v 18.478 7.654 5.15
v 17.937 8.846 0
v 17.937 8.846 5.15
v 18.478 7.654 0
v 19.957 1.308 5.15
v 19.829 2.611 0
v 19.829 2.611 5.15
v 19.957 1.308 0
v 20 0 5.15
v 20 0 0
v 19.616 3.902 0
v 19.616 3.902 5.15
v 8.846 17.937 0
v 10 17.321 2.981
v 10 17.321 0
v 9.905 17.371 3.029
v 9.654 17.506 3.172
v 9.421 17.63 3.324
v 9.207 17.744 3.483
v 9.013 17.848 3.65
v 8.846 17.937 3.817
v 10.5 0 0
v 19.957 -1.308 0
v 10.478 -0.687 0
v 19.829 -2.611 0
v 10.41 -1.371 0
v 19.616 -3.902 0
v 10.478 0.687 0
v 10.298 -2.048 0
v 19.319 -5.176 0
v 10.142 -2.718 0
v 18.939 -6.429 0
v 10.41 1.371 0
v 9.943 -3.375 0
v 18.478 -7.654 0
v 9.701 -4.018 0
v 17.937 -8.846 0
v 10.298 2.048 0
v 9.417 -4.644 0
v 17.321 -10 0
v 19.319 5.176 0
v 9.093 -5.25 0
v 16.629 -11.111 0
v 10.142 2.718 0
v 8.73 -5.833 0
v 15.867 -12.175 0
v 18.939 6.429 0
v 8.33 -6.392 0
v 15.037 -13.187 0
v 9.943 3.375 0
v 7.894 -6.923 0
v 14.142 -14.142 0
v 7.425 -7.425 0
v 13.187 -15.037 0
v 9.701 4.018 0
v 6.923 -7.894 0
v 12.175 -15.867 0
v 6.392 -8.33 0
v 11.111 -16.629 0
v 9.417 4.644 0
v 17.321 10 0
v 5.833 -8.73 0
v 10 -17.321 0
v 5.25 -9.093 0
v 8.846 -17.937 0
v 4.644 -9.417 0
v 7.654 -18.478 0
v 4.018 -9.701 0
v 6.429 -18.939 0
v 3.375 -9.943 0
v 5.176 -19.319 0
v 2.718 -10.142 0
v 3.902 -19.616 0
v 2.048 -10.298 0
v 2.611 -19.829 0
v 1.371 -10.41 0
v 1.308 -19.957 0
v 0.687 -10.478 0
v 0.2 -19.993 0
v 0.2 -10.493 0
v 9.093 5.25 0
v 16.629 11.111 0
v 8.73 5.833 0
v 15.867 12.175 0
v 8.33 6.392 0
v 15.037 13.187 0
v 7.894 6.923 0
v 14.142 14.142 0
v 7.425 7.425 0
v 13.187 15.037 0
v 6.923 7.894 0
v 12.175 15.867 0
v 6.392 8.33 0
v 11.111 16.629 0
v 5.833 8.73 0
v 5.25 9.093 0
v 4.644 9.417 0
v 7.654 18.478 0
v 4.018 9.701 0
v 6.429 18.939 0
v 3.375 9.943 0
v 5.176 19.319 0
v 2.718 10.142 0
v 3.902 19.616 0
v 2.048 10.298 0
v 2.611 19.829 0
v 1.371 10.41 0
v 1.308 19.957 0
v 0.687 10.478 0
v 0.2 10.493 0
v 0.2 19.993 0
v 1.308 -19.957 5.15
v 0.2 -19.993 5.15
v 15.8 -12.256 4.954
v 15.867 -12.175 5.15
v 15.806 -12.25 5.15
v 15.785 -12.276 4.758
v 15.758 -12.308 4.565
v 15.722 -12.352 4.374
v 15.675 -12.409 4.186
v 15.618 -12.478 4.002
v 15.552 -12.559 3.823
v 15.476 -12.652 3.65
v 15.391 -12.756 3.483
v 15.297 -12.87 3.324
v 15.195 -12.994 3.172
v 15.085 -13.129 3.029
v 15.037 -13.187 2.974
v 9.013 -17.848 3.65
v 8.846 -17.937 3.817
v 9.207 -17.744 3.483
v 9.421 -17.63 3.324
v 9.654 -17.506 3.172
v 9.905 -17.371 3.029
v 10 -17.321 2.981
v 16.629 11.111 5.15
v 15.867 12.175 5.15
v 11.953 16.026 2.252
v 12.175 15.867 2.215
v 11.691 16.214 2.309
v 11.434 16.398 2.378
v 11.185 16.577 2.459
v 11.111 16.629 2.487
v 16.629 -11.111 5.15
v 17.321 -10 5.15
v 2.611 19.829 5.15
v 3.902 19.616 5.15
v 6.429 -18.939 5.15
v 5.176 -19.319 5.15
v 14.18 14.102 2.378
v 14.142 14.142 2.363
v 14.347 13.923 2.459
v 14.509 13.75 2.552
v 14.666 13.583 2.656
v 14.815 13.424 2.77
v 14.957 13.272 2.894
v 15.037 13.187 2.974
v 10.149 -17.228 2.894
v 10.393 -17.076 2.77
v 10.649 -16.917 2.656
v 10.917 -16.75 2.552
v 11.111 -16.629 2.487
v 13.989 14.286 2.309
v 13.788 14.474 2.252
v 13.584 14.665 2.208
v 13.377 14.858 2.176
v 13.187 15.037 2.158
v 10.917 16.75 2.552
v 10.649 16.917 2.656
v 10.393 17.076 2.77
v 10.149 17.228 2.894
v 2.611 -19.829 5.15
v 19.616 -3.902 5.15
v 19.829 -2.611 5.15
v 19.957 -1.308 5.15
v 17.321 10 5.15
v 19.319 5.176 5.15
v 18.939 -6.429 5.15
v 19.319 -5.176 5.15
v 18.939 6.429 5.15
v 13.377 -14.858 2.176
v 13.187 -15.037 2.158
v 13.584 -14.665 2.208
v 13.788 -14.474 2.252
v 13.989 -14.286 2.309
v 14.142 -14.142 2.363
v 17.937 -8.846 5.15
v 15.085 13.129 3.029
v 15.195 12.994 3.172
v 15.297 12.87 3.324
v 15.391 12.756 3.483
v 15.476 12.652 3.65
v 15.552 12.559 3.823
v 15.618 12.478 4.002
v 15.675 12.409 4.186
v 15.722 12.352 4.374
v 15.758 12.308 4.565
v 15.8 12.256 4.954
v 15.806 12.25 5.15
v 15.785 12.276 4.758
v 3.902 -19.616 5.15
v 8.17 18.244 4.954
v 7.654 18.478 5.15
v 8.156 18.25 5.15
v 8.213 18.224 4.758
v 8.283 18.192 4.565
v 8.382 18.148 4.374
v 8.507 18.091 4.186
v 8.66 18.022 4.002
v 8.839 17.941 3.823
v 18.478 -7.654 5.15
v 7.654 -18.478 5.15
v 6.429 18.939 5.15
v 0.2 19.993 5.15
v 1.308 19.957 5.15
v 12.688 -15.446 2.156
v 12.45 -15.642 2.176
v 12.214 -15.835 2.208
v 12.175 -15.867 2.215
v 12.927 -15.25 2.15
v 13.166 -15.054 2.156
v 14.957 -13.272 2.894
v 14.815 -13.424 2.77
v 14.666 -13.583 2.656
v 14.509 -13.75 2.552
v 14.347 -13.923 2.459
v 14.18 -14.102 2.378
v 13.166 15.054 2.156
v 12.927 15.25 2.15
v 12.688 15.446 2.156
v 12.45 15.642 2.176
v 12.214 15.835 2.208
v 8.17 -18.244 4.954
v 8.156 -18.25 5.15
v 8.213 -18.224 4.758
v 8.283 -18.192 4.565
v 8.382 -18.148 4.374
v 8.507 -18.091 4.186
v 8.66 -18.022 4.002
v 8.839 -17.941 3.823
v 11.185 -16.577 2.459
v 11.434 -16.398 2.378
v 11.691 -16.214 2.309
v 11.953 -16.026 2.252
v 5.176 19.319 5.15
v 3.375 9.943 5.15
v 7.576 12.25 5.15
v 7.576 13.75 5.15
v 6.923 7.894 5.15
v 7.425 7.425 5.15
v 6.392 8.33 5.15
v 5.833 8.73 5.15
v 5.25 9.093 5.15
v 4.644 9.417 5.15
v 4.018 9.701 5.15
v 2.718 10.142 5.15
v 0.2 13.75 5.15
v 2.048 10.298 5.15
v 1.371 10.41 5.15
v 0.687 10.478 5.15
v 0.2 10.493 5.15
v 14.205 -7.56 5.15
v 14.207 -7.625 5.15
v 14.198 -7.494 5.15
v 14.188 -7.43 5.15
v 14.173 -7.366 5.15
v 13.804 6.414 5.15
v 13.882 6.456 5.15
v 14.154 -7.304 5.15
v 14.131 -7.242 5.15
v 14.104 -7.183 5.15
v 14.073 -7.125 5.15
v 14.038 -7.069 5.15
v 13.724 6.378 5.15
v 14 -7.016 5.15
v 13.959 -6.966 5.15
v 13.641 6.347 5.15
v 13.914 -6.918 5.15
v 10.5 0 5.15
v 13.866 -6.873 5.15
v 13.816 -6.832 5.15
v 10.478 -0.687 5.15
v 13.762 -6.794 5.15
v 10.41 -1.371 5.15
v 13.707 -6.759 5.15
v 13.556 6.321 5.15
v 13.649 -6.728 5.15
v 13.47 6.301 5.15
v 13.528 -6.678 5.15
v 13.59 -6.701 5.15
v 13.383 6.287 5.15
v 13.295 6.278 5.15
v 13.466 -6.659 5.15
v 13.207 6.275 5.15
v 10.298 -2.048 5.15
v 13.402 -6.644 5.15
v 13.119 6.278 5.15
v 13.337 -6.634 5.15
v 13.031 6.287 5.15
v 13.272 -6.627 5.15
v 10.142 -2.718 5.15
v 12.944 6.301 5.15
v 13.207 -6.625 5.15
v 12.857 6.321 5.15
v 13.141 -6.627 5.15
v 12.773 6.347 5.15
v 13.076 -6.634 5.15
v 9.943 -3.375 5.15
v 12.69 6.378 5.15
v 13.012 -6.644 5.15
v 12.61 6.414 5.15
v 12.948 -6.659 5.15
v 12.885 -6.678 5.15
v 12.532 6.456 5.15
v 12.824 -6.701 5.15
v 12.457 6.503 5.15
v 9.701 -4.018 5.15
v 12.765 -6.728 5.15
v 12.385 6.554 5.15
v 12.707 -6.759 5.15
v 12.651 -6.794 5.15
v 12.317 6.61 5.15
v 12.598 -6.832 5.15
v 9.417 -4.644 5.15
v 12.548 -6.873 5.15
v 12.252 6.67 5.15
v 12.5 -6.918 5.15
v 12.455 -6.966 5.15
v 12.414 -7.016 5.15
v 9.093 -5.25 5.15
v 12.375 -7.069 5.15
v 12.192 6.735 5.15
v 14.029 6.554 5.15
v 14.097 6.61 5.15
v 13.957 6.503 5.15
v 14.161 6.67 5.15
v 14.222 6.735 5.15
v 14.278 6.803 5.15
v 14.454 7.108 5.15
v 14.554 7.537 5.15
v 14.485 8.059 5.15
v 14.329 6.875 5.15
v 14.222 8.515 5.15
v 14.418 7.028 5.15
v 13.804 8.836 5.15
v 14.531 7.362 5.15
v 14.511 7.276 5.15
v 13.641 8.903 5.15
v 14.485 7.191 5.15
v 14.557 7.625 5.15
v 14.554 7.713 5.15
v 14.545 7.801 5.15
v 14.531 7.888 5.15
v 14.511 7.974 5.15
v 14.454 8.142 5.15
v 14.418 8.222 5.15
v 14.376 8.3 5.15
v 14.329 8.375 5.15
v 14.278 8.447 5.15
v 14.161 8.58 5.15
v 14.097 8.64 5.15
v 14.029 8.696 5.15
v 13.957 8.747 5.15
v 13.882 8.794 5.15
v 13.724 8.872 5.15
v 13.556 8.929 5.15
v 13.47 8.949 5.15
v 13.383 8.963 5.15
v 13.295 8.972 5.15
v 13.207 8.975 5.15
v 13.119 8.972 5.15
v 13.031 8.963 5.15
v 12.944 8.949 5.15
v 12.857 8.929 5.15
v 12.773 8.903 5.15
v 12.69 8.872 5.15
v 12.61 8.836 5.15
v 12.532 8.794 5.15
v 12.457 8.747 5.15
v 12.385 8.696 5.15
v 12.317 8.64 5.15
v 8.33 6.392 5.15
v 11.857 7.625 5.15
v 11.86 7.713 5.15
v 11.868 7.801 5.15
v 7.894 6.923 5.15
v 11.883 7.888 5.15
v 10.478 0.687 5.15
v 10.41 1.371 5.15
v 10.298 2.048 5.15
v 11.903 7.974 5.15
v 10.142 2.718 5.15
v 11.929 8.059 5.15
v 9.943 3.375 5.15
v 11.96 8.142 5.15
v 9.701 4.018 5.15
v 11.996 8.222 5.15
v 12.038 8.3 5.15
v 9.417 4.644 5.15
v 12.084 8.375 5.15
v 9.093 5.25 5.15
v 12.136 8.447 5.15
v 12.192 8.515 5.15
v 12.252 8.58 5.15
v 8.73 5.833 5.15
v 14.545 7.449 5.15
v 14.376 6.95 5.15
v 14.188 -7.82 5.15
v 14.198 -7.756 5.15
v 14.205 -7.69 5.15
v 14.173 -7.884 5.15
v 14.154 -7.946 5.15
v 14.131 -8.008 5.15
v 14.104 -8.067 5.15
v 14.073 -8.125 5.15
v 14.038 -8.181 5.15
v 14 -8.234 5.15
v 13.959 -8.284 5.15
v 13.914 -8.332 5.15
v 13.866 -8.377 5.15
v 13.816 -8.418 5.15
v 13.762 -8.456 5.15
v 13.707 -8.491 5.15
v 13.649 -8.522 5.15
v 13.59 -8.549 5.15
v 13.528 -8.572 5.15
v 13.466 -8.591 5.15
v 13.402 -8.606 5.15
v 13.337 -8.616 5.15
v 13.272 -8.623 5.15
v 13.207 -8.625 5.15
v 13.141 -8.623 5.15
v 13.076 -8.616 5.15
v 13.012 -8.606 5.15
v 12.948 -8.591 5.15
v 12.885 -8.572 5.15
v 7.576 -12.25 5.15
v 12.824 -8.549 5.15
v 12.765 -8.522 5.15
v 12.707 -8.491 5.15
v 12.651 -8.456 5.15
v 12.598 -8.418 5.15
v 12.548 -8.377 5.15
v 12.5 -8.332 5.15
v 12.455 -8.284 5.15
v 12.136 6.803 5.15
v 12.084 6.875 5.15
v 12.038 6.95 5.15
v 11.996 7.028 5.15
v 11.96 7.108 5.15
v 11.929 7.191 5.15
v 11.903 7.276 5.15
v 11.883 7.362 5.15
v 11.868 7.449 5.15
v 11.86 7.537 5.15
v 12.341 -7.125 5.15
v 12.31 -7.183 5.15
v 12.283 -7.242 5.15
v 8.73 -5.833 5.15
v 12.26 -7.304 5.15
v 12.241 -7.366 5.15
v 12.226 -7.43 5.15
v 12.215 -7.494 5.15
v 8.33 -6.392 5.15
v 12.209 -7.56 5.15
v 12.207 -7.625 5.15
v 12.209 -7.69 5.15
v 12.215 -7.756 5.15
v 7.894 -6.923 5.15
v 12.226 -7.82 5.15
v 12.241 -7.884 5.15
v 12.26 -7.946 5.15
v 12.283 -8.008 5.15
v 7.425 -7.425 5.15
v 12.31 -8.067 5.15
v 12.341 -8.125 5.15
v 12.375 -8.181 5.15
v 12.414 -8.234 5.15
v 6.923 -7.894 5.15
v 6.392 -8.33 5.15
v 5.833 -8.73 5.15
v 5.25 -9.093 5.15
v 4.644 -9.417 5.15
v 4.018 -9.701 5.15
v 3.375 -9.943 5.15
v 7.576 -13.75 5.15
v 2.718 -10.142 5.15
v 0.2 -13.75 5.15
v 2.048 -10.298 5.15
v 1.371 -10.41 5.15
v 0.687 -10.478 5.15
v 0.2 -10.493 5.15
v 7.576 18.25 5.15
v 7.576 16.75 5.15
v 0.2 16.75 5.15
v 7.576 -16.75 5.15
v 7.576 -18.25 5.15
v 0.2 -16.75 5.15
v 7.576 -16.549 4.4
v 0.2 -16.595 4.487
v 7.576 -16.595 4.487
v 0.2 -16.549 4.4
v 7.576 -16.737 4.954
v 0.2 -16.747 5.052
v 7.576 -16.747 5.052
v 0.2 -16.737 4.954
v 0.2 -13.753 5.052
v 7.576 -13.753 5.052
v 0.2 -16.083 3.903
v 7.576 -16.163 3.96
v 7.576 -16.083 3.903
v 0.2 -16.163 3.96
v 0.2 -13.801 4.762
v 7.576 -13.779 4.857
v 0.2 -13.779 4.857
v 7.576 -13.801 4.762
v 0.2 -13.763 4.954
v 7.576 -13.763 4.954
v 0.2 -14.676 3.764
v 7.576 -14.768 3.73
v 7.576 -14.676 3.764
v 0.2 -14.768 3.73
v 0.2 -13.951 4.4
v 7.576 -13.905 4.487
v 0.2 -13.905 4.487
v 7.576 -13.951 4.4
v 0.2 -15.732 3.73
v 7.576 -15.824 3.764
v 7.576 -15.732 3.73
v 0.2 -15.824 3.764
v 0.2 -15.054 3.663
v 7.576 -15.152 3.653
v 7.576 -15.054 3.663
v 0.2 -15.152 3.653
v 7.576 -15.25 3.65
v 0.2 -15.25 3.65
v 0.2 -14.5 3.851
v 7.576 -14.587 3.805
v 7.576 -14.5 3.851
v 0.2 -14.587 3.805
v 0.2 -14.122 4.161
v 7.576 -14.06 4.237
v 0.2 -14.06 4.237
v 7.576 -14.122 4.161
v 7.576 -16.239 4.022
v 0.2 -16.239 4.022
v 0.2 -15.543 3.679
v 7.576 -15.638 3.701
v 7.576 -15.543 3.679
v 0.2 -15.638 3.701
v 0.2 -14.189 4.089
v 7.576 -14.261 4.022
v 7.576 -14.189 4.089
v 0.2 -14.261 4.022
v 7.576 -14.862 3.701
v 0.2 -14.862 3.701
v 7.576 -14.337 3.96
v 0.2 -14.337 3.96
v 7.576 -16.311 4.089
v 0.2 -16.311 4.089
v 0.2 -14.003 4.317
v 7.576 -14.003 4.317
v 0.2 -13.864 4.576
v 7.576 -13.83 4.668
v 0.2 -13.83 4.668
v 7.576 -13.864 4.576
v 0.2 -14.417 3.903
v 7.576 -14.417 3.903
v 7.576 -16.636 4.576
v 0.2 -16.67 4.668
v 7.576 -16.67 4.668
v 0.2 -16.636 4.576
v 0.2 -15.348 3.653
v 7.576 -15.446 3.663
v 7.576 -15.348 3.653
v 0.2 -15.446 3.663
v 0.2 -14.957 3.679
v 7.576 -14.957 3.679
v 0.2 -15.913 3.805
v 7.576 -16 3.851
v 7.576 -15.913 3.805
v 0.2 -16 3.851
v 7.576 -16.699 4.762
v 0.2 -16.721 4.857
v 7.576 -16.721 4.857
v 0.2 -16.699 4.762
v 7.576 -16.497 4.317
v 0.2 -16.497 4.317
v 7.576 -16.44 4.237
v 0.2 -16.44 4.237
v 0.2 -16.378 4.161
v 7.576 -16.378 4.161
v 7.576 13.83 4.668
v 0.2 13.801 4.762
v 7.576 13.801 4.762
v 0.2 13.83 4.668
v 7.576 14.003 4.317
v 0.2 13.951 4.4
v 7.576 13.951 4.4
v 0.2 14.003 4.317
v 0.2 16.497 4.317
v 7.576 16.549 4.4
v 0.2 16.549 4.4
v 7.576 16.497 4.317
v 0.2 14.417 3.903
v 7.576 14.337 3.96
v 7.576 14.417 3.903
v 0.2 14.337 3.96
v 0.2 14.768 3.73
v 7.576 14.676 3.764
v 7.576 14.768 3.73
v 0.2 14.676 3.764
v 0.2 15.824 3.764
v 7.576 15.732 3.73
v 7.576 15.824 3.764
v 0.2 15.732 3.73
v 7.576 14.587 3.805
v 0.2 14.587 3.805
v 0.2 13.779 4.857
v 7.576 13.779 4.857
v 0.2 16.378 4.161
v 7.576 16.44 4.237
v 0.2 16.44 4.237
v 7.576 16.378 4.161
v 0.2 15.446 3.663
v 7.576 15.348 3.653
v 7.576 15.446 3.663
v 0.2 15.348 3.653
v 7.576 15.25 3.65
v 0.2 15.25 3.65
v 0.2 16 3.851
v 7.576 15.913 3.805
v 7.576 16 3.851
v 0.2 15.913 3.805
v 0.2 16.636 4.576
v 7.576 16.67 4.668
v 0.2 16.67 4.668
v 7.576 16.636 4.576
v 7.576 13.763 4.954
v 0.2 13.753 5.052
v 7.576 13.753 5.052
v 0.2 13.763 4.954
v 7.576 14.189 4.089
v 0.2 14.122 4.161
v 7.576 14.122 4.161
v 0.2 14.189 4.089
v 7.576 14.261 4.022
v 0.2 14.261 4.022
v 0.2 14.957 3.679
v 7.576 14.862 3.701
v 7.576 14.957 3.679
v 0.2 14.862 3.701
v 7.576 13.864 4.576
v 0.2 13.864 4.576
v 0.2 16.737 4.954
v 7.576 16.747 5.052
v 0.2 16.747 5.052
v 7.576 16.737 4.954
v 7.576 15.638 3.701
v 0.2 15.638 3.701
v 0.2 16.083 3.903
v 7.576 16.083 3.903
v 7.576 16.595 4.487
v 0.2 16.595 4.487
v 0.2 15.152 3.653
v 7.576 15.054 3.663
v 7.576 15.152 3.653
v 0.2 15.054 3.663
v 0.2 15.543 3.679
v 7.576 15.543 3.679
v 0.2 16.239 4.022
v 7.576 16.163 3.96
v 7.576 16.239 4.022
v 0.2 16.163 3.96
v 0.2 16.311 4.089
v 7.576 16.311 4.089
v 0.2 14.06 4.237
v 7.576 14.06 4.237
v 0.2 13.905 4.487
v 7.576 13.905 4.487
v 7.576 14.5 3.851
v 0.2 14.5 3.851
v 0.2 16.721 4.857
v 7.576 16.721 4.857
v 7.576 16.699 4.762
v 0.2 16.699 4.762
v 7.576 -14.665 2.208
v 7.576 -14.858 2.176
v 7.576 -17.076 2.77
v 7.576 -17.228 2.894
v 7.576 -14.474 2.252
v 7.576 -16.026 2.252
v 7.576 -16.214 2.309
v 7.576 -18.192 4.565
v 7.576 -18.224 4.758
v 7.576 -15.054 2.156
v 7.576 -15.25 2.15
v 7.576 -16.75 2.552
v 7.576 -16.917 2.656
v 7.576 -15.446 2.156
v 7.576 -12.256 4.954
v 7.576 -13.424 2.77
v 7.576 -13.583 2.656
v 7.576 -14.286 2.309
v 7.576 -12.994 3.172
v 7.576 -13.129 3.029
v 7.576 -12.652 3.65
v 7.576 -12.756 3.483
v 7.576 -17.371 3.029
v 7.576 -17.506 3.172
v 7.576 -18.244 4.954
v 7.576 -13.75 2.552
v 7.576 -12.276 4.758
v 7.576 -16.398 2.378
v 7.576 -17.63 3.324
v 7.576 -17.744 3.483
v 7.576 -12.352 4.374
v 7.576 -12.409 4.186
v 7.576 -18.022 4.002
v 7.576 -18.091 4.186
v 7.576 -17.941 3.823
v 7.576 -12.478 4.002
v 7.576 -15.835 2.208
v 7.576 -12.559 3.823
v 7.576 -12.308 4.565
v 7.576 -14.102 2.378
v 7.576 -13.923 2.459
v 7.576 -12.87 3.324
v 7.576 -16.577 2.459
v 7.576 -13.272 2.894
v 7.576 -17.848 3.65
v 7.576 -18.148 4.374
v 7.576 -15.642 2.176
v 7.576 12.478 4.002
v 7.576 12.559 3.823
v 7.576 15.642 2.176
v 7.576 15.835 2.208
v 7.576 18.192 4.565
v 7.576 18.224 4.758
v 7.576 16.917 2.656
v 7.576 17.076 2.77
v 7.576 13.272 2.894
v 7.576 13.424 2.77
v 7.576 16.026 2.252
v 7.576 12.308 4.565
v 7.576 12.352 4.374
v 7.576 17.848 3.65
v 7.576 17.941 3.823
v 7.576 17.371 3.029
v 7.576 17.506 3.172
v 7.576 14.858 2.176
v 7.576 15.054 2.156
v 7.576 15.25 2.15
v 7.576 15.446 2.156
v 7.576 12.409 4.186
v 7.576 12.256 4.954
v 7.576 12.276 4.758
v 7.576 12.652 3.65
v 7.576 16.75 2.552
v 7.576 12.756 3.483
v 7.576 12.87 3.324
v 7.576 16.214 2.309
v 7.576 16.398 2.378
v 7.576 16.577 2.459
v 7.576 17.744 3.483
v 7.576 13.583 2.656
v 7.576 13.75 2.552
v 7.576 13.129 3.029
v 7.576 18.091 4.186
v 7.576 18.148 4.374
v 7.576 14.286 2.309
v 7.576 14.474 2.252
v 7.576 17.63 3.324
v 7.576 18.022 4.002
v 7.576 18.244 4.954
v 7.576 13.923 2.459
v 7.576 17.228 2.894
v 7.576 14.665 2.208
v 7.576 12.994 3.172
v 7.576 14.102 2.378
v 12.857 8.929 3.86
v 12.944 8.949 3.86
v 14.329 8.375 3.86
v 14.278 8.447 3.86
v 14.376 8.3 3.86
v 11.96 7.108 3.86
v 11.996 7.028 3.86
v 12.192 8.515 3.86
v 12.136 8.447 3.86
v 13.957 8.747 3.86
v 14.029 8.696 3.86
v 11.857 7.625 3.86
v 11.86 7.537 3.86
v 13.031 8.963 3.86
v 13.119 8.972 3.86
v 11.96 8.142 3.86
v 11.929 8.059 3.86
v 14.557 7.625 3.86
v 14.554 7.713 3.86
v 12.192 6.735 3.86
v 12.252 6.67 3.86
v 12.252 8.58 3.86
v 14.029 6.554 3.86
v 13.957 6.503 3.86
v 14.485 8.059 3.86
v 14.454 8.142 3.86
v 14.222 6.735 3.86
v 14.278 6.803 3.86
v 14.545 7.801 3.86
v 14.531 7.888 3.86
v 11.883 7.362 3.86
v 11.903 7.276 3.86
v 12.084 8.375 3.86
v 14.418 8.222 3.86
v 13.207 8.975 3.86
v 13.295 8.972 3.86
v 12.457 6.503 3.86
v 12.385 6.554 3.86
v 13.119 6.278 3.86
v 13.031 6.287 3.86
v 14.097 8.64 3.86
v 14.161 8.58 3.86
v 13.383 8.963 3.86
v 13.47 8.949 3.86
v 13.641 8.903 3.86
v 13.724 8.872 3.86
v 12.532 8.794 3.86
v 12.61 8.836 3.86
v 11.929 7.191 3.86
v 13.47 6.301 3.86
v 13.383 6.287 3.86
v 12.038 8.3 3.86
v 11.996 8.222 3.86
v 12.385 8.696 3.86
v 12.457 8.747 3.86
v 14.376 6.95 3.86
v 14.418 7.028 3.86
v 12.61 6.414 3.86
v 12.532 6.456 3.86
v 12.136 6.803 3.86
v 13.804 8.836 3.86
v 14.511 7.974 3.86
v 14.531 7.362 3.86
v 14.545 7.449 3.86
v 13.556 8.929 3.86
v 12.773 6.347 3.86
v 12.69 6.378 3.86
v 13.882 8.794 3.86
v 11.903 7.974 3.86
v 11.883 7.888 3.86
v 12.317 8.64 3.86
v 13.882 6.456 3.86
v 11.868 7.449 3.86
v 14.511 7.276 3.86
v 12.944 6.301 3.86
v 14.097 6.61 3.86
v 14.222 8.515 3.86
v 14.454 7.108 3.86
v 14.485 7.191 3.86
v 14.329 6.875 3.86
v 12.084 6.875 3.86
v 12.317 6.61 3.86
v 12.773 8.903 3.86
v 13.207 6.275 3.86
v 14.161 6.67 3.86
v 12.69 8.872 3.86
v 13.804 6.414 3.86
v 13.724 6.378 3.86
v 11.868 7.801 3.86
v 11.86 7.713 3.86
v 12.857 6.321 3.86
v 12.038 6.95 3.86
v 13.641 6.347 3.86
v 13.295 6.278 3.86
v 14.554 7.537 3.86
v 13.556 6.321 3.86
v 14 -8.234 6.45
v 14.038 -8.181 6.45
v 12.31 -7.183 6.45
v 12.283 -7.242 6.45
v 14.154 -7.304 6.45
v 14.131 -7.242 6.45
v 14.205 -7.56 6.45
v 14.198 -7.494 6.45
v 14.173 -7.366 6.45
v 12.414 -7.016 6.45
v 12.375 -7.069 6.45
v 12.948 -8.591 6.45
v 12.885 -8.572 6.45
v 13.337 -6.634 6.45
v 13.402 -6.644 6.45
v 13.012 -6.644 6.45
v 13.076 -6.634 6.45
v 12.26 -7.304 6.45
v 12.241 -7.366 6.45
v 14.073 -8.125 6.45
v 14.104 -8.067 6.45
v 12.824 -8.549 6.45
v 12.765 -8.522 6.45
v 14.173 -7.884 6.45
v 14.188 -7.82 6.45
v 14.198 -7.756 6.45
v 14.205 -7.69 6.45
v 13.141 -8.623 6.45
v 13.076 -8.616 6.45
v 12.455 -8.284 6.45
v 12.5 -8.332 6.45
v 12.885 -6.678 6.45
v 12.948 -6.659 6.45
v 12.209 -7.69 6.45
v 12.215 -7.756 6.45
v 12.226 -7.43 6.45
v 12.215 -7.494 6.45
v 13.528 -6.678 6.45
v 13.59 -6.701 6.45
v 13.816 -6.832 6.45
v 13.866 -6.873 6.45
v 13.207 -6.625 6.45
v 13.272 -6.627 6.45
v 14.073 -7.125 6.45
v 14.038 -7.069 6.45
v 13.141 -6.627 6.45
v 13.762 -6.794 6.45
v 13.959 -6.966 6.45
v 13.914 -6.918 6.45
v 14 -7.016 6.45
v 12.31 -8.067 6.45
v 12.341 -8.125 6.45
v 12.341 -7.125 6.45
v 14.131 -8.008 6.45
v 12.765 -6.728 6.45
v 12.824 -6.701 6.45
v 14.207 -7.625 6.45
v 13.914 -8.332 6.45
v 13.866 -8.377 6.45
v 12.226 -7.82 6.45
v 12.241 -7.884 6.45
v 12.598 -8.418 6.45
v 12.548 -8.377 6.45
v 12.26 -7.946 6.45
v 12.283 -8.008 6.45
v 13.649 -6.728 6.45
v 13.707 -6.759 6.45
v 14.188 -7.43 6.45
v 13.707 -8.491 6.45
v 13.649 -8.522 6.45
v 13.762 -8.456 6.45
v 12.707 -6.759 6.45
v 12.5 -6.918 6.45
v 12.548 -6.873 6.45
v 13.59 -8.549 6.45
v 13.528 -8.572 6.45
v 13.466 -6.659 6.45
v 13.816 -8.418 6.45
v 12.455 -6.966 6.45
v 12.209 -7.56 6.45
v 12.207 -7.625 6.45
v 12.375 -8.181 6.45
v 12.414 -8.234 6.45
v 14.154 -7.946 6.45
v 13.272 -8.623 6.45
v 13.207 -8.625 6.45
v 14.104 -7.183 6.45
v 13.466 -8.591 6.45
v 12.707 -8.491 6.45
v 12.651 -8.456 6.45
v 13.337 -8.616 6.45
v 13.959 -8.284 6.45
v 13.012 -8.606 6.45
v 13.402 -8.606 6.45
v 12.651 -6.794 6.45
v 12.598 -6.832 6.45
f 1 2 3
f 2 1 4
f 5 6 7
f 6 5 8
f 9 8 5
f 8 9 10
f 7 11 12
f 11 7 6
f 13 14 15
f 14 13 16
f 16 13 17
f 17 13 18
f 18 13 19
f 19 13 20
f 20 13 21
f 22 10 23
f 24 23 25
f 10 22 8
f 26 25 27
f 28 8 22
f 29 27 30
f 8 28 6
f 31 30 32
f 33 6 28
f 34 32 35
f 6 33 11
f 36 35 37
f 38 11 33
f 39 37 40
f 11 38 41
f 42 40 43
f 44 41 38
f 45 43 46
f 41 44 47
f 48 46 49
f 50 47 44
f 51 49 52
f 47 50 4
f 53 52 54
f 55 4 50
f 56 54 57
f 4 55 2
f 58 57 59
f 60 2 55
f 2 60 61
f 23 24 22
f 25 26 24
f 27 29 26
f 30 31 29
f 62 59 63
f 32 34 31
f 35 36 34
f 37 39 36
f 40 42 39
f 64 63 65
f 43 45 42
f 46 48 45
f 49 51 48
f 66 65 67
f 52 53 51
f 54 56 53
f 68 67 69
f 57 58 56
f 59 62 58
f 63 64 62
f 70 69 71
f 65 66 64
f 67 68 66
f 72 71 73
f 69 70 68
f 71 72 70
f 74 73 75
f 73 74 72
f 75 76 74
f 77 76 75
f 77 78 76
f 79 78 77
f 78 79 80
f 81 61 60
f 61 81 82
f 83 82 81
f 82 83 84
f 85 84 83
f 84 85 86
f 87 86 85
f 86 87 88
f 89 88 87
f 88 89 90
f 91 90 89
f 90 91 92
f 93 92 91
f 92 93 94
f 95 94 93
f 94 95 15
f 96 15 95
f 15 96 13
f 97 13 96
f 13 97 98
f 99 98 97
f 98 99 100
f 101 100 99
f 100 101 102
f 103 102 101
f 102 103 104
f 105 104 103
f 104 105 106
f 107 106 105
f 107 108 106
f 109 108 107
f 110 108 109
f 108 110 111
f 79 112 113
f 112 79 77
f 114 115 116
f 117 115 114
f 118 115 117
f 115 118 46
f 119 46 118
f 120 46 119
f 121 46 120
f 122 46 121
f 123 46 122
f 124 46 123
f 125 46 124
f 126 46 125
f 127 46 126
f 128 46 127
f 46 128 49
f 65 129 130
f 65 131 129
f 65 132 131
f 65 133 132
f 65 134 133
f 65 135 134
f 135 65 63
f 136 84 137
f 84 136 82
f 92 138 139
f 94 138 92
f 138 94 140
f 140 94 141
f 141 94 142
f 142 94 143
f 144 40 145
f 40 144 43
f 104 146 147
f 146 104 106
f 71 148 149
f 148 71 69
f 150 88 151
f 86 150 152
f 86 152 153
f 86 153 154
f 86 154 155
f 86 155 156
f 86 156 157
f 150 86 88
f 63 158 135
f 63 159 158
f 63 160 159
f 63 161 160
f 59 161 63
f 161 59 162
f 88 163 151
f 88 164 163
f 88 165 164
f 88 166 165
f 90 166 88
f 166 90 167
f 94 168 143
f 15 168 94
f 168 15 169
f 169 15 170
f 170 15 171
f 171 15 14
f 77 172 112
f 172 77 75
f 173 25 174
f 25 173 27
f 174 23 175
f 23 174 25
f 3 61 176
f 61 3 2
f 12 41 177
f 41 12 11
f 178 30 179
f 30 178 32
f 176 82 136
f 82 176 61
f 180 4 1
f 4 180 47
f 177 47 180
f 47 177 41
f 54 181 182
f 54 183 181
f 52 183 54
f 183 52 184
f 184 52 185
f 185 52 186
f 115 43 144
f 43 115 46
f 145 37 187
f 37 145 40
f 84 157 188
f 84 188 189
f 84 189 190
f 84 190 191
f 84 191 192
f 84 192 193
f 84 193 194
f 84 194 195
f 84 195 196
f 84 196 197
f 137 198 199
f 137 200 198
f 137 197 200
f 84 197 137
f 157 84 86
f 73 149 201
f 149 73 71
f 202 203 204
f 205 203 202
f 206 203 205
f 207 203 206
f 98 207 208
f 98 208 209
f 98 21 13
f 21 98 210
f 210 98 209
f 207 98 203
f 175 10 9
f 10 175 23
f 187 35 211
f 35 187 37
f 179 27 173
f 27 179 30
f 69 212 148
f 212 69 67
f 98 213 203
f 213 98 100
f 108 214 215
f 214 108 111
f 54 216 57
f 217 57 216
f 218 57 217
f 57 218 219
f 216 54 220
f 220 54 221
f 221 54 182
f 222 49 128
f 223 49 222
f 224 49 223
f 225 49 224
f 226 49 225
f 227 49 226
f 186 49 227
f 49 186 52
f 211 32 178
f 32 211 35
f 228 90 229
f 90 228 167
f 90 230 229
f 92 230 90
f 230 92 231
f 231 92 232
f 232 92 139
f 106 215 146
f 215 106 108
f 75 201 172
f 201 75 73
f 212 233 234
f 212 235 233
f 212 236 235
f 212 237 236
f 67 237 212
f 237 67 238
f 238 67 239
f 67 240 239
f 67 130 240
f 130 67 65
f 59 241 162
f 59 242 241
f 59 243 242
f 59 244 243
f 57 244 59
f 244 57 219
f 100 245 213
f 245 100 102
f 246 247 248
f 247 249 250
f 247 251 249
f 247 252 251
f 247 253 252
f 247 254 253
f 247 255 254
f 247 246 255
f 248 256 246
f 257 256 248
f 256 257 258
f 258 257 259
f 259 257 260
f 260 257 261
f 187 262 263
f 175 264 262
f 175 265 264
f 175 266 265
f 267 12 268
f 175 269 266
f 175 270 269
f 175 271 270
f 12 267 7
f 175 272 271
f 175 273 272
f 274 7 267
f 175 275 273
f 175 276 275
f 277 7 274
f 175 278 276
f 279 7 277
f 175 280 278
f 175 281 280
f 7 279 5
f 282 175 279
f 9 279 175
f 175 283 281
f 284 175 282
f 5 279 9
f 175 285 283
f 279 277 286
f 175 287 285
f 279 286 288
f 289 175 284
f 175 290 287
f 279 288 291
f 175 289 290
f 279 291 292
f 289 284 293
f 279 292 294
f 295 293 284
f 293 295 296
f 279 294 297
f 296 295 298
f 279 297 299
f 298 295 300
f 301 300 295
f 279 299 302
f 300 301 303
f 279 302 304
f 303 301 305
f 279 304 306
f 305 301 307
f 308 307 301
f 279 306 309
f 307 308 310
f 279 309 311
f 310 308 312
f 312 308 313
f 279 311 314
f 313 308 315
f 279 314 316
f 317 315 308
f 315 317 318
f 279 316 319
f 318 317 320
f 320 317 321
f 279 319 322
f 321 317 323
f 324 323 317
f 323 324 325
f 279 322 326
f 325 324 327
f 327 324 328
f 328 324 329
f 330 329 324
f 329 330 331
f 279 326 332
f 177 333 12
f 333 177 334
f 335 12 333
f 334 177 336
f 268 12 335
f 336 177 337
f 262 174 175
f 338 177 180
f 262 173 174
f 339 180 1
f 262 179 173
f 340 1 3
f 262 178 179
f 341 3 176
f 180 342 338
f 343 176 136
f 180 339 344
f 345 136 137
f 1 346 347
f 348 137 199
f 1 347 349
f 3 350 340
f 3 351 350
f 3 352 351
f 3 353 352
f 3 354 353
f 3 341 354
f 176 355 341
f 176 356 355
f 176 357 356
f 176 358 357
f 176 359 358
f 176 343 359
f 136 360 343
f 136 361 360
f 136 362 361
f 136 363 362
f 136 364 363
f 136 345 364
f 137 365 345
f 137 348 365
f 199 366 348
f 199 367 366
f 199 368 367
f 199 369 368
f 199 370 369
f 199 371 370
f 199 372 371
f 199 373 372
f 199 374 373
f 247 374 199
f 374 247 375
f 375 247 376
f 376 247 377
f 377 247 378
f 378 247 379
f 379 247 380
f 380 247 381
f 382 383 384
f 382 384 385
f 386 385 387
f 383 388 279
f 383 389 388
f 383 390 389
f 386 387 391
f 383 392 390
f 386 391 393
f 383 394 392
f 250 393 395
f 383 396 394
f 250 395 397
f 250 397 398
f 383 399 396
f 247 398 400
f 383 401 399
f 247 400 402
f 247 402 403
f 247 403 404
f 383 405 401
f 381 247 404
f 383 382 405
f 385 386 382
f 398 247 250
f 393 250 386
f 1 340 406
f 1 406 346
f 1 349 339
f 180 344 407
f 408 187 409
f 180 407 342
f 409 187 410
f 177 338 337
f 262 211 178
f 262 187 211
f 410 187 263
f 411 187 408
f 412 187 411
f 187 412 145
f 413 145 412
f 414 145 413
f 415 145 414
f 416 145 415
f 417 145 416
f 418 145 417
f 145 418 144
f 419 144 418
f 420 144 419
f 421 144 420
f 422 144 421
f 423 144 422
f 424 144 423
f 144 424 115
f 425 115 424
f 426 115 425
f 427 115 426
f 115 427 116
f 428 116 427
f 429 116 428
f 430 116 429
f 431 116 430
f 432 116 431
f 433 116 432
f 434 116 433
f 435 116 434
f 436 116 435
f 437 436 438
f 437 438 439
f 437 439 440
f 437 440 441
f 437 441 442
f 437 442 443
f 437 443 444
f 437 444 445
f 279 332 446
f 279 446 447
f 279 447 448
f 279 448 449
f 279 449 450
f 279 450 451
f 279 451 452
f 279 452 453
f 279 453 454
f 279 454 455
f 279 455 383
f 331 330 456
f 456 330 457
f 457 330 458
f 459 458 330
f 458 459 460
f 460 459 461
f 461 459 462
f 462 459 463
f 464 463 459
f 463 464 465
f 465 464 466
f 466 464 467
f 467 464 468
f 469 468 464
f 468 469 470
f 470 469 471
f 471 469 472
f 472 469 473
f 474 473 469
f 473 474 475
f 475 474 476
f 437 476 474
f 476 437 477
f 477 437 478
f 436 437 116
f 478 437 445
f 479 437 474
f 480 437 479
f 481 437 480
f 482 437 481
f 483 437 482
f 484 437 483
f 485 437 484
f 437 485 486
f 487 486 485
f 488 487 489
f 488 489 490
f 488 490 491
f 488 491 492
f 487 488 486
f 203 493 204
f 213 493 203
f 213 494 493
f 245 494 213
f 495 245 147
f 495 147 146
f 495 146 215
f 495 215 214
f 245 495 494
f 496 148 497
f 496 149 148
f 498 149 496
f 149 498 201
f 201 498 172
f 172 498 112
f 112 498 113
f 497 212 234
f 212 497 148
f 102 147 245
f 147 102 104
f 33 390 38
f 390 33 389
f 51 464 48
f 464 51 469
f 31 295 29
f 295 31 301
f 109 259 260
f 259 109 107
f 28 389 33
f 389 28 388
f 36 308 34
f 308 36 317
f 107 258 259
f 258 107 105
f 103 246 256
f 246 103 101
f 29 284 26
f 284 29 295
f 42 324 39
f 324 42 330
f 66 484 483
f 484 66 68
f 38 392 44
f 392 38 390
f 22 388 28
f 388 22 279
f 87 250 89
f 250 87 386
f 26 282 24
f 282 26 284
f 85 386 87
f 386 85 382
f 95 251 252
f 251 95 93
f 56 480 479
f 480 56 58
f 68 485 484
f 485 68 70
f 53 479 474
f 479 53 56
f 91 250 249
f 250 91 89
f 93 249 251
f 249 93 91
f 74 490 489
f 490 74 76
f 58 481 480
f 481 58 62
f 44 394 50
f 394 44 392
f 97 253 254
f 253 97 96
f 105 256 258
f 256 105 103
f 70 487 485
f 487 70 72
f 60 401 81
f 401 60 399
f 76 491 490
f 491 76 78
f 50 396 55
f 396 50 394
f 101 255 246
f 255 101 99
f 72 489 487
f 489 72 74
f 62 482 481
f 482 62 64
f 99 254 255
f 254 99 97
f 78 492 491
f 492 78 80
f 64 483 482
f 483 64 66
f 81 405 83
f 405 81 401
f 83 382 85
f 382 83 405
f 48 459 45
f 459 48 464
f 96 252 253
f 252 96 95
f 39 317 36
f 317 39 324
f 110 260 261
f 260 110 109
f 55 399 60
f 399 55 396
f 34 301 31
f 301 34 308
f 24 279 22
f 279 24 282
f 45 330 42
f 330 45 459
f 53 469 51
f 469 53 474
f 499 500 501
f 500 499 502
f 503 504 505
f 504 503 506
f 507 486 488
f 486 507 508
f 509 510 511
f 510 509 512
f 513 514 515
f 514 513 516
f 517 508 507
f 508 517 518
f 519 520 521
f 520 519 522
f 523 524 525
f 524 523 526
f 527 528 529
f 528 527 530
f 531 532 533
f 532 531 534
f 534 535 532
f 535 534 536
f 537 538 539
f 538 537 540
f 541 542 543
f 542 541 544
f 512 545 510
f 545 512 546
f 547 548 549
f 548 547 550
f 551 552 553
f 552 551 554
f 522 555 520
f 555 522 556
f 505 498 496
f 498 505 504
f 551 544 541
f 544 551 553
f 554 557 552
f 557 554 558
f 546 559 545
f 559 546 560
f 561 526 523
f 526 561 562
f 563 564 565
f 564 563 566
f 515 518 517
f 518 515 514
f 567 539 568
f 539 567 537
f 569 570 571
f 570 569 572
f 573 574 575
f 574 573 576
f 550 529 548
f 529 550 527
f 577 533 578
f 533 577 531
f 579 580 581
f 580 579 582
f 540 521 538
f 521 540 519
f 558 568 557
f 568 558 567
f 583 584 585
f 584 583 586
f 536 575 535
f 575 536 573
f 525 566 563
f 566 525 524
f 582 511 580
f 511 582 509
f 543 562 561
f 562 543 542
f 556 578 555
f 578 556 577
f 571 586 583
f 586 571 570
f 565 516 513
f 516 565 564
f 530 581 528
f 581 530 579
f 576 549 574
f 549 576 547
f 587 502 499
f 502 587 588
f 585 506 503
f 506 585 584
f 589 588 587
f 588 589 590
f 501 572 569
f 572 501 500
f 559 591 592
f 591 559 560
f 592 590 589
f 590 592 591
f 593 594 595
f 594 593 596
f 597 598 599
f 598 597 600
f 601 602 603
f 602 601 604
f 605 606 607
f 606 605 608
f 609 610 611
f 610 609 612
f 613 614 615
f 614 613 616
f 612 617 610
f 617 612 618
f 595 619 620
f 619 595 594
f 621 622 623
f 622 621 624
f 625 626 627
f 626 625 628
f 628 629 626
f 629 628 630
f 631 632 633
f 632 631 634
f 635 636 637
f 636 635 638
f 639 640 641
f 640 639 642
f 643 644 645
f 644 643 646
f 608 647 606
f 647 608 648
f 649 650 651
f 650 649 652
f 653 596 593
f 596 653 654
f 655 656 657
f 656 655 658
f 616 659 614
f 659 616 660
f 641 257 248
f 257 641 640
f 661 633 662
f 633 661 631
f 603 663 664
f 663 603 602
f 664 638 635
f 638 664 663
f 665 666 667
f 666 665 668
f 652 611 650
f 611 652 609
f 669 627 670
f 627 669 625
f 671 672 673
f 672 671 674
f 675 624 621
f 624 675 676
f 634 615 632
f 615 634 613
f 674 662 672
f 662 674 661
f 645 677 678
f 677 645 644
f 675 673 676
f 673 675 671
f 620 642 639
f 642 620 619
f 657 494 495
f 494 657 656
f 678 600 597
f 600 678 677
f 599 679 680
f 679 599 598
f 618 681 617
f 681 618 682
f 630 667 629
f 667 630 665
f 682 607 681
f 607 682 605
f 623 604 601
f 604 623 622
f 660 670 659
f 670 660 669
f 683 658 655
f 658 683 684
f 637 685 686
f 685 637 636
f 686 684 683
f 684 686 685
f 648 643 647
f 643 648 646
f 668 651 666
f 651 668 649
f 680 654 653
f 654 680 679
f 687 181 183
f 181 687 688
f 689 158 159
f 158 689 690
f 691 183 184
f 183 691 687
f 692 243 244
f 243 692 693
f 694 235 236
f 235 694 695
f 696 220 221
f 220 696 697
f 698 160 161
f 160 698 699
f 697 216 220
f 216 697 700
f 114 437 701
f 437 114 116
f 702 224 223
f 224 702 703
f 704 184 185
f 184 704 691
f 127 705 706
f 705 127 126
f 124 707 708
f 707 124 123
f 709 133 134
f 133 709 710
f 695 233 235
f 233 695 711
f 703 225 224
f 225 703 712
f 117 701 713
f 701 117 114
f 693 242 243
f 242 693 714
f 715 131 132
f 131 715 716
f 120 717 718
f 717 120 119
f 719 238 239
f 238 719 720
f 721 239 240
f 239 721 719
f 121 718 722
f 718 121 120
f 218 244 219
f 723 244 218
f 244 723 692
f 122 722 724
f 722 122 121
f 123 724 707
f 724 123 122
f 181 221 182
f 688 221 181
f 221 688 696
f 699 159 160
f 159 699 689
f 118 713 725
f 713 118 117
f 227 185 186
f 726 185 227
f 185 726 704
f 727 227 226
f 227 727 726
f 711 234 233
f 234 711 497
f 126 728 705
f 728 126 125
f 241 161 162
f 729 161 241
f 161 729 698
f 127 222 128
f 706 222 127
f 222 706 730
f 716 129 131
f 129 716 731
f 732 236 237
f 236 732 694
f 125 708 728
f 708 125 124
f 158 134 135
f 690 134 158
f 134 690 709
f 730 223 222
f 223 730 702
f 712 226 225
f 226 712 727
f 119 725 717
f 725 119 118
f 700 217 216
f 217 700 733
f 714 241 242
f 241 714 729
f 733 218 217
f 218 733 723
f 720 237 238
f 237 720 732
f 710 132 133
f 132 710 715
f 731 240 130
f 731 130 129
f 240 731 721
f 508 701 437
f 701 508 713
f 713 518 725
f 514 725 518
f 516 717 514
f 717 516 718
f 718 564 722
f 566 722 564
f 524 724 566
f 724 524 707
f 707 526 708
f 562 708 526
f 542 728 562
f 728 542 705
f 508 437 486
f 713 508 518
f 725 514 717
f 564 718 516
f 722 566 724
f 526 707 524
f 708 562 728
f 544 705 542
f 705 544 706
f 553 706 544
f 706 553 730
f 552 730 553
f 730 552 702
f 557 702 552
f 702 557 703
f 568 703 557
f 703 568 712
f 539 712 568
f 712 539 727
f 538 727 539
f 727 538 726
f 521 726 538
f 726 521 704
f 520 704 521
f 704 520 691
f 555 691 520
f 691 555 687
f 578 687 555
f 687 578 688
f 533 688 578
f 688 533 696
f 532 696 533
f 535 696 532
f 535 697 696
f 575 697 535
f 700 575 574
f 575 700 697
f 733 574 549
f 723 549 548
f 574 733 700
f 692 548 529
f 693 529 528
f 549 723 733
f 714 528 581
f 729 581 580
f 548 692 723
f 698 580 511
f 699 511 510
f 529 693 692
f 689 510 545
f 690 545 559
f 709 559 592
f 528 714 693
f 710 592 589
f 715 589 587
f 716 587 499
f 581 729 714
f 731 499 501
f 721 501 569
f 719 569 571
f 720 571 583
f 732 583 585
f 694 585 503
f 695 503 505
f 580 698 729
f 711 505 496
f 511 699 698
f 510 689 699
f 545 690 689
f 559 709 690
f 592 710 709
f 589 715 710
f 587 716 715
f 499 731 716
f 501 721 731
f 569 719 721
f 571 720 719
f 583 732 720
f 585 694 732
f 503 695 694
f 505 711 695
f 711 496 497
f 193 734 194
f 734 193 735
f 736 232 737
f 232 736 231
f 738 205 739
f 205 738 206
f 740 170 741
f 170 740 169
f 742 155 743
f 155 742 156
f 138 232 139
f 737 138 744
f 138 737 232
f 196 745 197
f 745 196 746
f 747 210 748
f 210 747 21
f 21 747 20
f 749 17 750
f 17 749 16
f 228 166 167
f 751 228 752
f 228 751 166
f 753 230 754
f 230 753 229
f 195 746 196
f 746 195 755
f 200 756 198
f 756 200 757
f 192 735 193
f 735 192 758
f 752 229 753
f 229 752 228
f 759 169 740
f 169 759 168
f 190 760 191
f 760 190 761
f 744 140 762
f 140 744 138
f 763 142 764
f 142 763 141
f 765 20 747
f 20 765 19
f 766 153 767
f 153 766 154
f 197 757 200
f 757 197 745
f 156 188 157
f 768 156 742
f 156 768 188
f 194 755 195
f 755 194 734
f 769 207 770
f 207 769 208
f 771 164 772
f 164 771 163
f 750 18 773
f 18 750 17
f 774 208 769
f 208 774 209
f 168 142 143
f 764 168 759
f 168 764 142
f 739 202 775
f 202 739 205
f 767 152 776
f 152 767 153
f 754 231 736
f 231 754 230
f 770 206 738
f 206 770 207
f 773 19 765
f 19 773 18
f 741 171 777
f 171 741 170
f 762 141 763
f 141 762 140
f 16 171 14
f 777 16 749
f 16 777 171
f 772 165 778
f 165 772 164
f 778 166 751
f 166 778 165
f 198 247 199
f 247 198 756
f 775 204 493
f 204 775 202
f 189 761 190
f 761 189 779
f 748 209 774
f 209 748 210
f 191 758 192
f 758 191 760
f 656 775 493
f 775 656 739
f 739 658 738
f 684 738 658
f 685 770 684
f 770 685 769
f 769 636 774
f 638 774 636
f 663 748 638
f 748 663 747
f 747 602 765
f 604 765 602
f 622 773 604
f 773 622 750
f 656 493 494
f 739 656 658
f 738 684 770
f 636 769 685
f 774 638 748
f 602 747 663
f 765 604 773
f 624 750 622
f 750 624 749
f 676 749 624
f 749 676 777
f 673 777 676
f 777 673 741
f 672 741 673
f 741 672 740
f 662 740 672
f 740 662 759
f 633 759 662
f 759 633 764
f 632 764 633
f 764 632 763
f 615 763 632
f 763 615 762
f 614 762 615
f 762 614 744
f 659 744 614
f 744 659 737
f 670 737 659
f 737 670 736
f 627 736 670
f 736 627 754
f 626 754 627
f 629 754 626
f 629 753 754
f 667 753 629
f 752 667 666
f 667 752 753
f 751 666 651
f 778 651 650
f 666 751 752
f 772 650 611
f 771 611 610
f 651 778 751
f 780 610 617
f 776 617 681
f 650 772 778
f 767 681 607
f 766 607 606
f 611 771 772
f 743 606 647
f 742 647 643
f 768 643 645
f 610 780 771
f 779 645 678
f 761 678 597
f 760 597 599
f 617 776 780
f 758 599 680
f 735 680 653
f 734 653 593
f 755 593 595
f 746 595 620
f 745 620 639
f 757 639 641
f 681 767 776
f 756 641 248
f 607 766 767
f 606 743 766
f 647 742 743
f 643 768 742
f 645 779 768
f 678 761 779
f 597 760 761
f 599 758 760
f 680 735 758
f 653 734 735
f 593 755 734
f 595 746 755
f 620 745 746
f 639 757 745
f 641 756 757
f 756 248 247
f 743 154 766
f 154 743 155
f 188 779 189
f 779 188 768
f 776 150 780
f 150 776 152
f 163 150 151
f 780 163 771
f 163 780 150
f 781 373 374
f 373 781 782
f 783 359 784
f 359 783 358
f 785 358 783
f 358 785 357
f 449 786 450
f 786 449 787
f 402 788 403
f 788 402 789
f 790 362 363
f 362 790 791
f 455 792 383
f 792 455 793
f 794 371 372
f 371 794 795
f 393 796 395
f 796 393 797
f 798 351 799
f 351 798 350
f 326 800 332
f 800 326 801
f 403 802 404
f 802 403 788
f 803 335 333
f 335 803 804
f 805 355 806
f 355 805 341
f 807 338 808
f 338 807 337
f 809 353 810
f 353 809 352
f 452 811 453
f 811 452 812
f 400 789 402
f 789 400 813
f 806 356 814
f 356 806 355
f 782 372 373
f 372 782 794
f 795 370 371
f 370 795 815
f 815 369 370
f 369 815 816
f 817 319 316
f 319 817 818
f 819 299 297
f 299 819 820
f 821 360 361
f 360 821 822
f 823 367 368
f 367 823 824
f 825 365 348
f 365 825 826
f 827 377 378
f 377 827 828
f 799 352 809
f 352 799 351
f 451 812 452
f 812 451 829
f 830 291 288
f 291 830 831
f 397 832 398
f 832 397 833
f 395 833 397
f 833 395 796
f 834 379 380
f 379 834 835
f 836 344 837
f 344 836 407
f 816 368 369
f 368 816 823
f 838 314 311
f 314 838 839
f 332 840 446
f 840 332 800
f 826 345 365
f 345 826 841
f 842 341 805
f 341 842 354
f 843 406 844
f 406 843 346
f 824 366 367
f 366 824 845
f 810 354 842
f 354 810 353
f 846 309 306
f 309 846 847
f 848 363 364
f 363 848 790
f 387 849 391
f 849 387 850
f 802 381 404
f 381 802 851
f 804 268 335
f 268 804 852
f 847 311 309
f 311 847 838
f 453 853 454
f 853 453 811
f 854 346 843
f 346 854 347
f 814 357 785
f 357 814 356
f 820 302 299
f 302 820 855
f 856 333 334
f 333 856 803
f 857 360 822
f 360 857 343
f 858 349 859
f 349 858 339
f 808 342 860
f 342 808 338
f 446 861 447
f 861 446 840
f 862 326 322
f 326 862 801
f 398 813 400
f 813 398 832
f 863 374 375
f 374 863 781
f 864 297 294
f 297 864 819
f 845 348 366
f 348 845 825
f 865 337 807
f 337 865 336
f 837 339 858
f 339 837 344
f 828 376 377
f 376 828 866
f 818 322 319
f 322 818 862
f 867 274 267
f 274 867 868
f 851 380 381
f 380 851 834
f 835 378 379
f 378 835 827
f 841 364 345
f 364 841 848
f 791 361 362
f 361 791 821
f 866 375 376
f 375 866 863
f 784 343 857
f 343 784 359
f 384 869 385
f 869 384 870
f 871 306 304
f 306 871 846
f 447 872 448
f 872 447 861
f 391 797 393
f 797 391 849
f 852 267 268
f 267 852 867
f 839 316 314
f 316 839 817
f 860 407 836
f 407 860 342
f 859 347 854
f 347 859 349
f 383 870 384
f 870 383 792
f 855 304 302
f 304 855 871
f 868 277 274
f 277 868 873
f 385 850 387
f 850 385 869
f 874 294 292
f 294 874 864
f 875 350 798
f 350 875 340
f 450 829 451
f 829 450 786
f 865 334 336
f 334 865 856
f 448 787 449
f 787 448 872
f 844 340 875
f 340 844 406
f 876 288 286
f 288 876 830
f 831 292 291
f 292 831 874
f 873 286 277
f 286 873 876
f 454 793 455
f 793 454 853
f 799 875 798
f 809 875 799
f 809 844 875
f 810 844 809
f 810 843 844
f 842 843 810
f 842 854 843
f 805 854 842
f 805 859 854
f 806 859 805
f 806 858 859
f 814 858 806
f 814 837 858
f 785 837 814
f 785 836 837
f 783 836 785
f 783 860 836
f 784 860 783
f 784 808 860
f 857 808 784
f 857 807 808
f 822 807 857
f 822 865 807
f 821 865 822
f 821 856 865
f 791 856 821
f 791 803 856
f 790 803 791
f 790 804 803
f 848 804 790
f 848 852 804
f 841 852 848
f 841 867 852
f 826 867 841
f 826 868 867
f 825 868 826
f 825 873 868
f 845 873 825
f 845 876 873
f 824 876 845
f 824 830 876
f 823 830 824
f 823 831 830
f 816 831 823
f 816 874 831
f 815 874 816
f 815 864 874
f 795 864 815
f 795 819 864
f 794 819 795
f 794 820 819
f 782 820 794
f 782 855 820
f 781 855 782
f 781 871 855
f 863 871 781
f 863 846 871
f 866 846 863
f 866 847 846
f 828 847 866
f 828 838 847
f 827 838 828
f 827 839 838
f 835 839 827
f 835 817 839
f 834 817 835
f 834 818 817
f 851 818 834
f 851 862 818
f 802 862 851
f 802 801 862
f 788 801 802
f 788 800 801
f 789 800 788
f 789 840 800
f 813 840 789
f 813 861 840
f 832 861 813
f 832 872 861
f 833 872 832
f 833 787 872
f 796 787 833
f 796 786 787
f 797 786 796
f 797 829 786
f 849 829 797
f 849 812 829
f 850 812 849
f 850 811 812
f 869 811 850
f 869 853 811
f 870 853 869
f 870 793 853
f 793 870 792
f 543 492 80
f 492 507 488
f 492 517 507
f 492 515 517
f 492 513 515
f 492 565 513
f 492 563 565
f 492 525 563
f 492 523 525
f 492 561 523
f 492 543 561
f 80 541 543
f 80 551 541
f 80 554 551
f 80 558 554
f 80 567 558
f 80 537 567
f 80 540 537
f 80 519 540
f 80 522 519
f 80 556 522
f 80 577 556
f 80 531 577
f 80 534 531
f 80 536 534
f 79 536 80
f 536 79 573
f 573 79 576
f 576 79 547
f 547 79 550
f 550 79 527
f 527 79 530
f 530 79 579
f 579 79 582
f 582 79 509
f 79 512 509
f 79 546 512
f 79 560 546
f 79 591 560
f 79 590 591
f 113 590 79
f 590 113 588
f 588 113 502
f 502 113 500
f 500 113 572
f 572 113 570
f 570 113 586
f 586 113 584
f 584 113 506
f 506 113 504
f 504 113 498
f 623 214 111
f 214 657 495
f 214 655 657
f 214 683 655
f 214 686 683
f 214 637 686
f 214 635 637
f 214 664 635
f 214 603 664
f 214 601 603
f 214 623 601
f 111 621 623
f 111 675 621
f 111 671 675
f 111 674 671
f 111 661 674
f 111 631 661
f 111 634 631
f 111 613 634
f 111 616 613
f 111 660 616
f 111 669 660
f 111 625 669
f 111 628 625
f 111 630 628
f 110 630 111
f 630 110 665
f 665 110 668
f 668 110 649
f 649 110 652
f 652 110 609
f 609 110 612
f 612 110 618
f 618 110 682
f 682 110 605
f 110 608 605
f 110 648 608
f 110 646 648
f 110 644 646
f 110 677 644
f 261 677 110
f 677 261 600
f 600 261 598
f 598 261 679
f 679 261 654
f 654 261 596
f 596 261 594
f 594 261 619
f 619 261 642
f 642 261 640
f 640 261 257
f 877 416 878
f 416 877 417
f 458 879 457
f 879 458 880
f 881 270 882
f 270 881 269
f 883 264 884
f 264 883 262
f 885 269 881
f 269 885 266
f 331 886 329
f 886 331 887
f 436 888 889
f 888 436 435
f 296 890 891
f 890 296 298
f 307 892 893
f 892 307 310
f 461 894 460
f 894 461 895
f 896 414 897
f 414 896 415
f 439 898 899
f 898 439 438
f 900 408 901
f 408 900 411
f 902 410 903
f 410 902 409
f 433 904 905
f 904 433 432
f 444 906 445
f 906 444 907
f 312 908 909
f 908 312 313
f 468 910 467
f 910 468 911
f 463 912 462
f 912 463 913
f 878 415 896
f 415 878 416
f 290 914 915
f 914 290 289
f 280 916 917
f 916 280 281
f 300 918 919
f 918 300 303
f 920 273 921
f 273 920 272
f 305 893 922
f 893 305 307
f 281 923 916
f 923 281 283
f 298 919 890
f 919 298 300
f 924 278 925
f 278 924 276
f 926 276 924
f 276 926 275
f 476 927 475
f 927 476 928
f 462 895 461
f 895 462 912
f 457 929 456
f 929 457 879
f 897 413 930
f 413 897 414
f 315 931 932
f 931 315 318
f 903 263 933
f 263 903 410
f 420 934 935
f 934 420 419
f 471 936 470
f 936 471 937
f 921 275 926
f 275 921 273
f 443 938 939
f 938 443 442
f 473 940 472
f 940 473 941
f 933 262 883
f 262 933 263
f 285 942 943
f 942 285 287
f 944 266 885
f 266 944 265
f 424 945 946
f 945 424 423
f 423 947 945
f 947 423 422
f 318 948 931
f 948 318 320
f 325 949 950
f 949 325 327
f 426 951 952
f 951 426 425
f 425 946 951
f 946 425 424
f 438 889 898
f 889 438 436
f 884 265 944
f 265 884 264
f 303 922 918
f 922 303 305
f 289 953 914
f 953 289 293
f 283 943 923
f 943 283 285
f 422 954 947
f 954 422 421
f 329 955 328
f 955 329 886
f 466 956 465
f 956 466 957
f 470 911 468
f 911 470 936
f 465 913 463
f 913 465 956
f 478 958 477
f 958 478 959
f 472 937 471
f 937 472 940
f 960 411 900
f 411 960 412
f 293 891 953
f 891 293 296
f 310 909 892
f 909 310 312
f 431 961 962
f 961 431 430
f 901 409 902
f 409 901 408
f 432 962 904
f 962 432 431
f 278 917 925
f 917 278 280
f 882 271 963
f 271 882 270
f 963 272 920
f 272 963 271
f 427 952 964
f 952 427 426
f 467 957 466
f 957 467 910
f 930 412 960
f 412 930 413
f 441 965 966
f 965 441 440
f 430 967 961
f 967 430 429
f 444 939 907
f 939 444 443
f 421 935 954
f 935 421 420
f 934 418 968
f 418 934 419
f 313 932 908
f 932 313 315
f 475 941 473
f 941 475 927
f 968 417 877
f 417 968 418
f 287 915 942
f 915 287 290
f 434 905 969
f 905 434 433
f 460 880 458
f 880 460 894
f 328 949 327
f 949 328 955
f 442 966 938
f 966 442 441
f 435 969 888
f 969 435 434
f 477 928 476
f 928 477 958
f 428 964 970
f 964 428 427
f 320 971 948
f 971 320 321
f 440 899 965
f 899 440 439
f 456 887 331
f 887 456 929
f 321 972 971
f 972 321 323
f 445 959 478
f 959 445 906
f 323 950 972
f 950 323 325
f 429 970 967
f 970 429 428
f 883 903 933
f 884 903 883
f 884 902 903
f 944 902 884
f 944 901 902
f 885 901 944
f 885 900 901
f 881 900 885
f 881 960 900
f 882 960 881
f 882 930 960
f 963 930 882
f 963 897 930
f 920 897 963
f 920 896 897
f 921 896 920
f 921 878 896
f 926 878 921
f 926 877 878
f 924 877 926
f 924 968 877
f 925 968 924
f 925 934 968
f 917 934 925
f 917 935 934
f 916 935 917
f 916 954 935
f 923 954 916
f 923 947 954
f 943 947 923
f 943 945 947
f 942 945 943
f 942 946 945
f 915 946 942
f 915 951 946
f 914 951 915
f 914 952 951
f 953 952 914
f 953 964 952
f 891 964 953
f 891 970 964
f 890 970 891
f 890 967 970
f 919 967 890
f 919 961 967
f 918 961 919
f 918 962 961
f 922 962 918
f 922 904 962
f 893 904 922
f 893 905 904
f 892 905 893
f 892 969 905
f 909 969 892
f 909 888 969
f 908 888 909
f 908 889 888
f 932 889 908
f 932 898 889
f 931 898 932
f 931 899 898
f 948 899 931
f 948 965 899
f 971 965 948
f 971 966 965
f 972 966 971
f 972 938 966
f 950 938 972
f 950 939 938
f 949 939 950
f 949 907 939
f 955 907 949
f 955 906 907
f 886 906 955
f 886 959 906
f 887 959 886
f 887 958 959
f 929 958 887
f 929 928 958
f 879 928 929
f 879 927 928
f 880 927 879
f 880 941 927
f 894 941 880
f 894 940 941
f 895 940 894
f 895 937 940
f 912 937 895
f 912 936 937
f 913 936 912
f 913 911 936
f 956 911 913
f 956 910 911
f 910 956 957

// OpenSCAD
/* Post base reinforcer for TM Cougar. Dimensions from
   https://drive.google.com/drive/u/0/folders/0B4y50yHPnOVeNzRyREZFdlA1VzQ
   */

width = 40;
height = 10.3;
center_diameter = 10.5 * 2;
bolt_diameter = 3;
epsilon=0.01;
epsilon2=2*epsilon;

alignment_post_diameter = 2.7;
alignment_post_clearance = 0.7;
alignment_post_length=2;

gap=0.4;

bolt_distance=(width-center_diameter)/4;

recess_diameter = bolt_diameter * 2;
recess_depth = bolt_diameter;

$fn=96;

module unit_half() {
  union() {
    difference () {
      // Outer shell
      cylinder(d=width, h=height/2);
      // Inner hole
      translate([0,0,-epsilon]) {
        cylinder(d=center_diameter, h=height/2+epsilon2);
      }
      // Bolt hole 1
      translate ([-epsilon,bolt_distance-width/2,height/2]) {
        rotate([0,90,0]) {
          cylinder(d=bolt_diameter, h=width/2+epsilon2);
        }
      }
      // Bolt hole 2
      translate ([-epsilon,width/2-bolt_distance,height/2]) {
        rotate([0,90,0]) {
          cylinder(d=bolt_diameter, h=width/2+epsilon2);
        }
      }
      // Recess hole 1
      translate([sin(90*((width - center_diameter)/width))*width/2-recess_diameter,bolt_distance-width/2,height/2]) {
        rotate([0,90,0]) {
          cylinder(d=recess_diameter, h=recess_depth*10);
        }
      }
      // Recess hole 1
      translate([sin(90*((width - center_diameter)/width))*width/2-recess_diameter,-(bolt_distance-width/2),height/2]) {
        rotate([0,90,0]) {
          cylinder(d=recess_diameter, h=recess_depth*10);
        }
      }
      // Alignment hole
      rotate([0,0,30]) {
        translate ([(center_diameter + width)/4, 0, height/2+epsilon-alignment_post_length+alignment_post_clearance]) {
          cylinder(d=alignment_post_diameter, h=alignment_post_length);
        }
      }
      // Cut it in half
      translate([-100+gap/2, -50, -1]) {
        cube(100, 100, 100, center=false);
      }
    }
    // Alignment post
    rotate([0,0,-30]) {
      translate ([(center_diameter + width)/4, 0, height/2]) {
        cylinder(d=alignment_post_diameter-alignment_post_clearance, h=alignment_post_length-alignment_post_clearance);
      }
    }
  }
}

module unit() {
  union() {
    unit_half();
    translate([0,0,height]) {
      mirror([0,0,1]) {
        unit_half();
      }
    }
  }
}

color([0.2,0.2,0.2]) {
  union() {
    unit_half();
    /* unit(); */
    /* mirror([1,0,0]) unit(); */
  }
}
